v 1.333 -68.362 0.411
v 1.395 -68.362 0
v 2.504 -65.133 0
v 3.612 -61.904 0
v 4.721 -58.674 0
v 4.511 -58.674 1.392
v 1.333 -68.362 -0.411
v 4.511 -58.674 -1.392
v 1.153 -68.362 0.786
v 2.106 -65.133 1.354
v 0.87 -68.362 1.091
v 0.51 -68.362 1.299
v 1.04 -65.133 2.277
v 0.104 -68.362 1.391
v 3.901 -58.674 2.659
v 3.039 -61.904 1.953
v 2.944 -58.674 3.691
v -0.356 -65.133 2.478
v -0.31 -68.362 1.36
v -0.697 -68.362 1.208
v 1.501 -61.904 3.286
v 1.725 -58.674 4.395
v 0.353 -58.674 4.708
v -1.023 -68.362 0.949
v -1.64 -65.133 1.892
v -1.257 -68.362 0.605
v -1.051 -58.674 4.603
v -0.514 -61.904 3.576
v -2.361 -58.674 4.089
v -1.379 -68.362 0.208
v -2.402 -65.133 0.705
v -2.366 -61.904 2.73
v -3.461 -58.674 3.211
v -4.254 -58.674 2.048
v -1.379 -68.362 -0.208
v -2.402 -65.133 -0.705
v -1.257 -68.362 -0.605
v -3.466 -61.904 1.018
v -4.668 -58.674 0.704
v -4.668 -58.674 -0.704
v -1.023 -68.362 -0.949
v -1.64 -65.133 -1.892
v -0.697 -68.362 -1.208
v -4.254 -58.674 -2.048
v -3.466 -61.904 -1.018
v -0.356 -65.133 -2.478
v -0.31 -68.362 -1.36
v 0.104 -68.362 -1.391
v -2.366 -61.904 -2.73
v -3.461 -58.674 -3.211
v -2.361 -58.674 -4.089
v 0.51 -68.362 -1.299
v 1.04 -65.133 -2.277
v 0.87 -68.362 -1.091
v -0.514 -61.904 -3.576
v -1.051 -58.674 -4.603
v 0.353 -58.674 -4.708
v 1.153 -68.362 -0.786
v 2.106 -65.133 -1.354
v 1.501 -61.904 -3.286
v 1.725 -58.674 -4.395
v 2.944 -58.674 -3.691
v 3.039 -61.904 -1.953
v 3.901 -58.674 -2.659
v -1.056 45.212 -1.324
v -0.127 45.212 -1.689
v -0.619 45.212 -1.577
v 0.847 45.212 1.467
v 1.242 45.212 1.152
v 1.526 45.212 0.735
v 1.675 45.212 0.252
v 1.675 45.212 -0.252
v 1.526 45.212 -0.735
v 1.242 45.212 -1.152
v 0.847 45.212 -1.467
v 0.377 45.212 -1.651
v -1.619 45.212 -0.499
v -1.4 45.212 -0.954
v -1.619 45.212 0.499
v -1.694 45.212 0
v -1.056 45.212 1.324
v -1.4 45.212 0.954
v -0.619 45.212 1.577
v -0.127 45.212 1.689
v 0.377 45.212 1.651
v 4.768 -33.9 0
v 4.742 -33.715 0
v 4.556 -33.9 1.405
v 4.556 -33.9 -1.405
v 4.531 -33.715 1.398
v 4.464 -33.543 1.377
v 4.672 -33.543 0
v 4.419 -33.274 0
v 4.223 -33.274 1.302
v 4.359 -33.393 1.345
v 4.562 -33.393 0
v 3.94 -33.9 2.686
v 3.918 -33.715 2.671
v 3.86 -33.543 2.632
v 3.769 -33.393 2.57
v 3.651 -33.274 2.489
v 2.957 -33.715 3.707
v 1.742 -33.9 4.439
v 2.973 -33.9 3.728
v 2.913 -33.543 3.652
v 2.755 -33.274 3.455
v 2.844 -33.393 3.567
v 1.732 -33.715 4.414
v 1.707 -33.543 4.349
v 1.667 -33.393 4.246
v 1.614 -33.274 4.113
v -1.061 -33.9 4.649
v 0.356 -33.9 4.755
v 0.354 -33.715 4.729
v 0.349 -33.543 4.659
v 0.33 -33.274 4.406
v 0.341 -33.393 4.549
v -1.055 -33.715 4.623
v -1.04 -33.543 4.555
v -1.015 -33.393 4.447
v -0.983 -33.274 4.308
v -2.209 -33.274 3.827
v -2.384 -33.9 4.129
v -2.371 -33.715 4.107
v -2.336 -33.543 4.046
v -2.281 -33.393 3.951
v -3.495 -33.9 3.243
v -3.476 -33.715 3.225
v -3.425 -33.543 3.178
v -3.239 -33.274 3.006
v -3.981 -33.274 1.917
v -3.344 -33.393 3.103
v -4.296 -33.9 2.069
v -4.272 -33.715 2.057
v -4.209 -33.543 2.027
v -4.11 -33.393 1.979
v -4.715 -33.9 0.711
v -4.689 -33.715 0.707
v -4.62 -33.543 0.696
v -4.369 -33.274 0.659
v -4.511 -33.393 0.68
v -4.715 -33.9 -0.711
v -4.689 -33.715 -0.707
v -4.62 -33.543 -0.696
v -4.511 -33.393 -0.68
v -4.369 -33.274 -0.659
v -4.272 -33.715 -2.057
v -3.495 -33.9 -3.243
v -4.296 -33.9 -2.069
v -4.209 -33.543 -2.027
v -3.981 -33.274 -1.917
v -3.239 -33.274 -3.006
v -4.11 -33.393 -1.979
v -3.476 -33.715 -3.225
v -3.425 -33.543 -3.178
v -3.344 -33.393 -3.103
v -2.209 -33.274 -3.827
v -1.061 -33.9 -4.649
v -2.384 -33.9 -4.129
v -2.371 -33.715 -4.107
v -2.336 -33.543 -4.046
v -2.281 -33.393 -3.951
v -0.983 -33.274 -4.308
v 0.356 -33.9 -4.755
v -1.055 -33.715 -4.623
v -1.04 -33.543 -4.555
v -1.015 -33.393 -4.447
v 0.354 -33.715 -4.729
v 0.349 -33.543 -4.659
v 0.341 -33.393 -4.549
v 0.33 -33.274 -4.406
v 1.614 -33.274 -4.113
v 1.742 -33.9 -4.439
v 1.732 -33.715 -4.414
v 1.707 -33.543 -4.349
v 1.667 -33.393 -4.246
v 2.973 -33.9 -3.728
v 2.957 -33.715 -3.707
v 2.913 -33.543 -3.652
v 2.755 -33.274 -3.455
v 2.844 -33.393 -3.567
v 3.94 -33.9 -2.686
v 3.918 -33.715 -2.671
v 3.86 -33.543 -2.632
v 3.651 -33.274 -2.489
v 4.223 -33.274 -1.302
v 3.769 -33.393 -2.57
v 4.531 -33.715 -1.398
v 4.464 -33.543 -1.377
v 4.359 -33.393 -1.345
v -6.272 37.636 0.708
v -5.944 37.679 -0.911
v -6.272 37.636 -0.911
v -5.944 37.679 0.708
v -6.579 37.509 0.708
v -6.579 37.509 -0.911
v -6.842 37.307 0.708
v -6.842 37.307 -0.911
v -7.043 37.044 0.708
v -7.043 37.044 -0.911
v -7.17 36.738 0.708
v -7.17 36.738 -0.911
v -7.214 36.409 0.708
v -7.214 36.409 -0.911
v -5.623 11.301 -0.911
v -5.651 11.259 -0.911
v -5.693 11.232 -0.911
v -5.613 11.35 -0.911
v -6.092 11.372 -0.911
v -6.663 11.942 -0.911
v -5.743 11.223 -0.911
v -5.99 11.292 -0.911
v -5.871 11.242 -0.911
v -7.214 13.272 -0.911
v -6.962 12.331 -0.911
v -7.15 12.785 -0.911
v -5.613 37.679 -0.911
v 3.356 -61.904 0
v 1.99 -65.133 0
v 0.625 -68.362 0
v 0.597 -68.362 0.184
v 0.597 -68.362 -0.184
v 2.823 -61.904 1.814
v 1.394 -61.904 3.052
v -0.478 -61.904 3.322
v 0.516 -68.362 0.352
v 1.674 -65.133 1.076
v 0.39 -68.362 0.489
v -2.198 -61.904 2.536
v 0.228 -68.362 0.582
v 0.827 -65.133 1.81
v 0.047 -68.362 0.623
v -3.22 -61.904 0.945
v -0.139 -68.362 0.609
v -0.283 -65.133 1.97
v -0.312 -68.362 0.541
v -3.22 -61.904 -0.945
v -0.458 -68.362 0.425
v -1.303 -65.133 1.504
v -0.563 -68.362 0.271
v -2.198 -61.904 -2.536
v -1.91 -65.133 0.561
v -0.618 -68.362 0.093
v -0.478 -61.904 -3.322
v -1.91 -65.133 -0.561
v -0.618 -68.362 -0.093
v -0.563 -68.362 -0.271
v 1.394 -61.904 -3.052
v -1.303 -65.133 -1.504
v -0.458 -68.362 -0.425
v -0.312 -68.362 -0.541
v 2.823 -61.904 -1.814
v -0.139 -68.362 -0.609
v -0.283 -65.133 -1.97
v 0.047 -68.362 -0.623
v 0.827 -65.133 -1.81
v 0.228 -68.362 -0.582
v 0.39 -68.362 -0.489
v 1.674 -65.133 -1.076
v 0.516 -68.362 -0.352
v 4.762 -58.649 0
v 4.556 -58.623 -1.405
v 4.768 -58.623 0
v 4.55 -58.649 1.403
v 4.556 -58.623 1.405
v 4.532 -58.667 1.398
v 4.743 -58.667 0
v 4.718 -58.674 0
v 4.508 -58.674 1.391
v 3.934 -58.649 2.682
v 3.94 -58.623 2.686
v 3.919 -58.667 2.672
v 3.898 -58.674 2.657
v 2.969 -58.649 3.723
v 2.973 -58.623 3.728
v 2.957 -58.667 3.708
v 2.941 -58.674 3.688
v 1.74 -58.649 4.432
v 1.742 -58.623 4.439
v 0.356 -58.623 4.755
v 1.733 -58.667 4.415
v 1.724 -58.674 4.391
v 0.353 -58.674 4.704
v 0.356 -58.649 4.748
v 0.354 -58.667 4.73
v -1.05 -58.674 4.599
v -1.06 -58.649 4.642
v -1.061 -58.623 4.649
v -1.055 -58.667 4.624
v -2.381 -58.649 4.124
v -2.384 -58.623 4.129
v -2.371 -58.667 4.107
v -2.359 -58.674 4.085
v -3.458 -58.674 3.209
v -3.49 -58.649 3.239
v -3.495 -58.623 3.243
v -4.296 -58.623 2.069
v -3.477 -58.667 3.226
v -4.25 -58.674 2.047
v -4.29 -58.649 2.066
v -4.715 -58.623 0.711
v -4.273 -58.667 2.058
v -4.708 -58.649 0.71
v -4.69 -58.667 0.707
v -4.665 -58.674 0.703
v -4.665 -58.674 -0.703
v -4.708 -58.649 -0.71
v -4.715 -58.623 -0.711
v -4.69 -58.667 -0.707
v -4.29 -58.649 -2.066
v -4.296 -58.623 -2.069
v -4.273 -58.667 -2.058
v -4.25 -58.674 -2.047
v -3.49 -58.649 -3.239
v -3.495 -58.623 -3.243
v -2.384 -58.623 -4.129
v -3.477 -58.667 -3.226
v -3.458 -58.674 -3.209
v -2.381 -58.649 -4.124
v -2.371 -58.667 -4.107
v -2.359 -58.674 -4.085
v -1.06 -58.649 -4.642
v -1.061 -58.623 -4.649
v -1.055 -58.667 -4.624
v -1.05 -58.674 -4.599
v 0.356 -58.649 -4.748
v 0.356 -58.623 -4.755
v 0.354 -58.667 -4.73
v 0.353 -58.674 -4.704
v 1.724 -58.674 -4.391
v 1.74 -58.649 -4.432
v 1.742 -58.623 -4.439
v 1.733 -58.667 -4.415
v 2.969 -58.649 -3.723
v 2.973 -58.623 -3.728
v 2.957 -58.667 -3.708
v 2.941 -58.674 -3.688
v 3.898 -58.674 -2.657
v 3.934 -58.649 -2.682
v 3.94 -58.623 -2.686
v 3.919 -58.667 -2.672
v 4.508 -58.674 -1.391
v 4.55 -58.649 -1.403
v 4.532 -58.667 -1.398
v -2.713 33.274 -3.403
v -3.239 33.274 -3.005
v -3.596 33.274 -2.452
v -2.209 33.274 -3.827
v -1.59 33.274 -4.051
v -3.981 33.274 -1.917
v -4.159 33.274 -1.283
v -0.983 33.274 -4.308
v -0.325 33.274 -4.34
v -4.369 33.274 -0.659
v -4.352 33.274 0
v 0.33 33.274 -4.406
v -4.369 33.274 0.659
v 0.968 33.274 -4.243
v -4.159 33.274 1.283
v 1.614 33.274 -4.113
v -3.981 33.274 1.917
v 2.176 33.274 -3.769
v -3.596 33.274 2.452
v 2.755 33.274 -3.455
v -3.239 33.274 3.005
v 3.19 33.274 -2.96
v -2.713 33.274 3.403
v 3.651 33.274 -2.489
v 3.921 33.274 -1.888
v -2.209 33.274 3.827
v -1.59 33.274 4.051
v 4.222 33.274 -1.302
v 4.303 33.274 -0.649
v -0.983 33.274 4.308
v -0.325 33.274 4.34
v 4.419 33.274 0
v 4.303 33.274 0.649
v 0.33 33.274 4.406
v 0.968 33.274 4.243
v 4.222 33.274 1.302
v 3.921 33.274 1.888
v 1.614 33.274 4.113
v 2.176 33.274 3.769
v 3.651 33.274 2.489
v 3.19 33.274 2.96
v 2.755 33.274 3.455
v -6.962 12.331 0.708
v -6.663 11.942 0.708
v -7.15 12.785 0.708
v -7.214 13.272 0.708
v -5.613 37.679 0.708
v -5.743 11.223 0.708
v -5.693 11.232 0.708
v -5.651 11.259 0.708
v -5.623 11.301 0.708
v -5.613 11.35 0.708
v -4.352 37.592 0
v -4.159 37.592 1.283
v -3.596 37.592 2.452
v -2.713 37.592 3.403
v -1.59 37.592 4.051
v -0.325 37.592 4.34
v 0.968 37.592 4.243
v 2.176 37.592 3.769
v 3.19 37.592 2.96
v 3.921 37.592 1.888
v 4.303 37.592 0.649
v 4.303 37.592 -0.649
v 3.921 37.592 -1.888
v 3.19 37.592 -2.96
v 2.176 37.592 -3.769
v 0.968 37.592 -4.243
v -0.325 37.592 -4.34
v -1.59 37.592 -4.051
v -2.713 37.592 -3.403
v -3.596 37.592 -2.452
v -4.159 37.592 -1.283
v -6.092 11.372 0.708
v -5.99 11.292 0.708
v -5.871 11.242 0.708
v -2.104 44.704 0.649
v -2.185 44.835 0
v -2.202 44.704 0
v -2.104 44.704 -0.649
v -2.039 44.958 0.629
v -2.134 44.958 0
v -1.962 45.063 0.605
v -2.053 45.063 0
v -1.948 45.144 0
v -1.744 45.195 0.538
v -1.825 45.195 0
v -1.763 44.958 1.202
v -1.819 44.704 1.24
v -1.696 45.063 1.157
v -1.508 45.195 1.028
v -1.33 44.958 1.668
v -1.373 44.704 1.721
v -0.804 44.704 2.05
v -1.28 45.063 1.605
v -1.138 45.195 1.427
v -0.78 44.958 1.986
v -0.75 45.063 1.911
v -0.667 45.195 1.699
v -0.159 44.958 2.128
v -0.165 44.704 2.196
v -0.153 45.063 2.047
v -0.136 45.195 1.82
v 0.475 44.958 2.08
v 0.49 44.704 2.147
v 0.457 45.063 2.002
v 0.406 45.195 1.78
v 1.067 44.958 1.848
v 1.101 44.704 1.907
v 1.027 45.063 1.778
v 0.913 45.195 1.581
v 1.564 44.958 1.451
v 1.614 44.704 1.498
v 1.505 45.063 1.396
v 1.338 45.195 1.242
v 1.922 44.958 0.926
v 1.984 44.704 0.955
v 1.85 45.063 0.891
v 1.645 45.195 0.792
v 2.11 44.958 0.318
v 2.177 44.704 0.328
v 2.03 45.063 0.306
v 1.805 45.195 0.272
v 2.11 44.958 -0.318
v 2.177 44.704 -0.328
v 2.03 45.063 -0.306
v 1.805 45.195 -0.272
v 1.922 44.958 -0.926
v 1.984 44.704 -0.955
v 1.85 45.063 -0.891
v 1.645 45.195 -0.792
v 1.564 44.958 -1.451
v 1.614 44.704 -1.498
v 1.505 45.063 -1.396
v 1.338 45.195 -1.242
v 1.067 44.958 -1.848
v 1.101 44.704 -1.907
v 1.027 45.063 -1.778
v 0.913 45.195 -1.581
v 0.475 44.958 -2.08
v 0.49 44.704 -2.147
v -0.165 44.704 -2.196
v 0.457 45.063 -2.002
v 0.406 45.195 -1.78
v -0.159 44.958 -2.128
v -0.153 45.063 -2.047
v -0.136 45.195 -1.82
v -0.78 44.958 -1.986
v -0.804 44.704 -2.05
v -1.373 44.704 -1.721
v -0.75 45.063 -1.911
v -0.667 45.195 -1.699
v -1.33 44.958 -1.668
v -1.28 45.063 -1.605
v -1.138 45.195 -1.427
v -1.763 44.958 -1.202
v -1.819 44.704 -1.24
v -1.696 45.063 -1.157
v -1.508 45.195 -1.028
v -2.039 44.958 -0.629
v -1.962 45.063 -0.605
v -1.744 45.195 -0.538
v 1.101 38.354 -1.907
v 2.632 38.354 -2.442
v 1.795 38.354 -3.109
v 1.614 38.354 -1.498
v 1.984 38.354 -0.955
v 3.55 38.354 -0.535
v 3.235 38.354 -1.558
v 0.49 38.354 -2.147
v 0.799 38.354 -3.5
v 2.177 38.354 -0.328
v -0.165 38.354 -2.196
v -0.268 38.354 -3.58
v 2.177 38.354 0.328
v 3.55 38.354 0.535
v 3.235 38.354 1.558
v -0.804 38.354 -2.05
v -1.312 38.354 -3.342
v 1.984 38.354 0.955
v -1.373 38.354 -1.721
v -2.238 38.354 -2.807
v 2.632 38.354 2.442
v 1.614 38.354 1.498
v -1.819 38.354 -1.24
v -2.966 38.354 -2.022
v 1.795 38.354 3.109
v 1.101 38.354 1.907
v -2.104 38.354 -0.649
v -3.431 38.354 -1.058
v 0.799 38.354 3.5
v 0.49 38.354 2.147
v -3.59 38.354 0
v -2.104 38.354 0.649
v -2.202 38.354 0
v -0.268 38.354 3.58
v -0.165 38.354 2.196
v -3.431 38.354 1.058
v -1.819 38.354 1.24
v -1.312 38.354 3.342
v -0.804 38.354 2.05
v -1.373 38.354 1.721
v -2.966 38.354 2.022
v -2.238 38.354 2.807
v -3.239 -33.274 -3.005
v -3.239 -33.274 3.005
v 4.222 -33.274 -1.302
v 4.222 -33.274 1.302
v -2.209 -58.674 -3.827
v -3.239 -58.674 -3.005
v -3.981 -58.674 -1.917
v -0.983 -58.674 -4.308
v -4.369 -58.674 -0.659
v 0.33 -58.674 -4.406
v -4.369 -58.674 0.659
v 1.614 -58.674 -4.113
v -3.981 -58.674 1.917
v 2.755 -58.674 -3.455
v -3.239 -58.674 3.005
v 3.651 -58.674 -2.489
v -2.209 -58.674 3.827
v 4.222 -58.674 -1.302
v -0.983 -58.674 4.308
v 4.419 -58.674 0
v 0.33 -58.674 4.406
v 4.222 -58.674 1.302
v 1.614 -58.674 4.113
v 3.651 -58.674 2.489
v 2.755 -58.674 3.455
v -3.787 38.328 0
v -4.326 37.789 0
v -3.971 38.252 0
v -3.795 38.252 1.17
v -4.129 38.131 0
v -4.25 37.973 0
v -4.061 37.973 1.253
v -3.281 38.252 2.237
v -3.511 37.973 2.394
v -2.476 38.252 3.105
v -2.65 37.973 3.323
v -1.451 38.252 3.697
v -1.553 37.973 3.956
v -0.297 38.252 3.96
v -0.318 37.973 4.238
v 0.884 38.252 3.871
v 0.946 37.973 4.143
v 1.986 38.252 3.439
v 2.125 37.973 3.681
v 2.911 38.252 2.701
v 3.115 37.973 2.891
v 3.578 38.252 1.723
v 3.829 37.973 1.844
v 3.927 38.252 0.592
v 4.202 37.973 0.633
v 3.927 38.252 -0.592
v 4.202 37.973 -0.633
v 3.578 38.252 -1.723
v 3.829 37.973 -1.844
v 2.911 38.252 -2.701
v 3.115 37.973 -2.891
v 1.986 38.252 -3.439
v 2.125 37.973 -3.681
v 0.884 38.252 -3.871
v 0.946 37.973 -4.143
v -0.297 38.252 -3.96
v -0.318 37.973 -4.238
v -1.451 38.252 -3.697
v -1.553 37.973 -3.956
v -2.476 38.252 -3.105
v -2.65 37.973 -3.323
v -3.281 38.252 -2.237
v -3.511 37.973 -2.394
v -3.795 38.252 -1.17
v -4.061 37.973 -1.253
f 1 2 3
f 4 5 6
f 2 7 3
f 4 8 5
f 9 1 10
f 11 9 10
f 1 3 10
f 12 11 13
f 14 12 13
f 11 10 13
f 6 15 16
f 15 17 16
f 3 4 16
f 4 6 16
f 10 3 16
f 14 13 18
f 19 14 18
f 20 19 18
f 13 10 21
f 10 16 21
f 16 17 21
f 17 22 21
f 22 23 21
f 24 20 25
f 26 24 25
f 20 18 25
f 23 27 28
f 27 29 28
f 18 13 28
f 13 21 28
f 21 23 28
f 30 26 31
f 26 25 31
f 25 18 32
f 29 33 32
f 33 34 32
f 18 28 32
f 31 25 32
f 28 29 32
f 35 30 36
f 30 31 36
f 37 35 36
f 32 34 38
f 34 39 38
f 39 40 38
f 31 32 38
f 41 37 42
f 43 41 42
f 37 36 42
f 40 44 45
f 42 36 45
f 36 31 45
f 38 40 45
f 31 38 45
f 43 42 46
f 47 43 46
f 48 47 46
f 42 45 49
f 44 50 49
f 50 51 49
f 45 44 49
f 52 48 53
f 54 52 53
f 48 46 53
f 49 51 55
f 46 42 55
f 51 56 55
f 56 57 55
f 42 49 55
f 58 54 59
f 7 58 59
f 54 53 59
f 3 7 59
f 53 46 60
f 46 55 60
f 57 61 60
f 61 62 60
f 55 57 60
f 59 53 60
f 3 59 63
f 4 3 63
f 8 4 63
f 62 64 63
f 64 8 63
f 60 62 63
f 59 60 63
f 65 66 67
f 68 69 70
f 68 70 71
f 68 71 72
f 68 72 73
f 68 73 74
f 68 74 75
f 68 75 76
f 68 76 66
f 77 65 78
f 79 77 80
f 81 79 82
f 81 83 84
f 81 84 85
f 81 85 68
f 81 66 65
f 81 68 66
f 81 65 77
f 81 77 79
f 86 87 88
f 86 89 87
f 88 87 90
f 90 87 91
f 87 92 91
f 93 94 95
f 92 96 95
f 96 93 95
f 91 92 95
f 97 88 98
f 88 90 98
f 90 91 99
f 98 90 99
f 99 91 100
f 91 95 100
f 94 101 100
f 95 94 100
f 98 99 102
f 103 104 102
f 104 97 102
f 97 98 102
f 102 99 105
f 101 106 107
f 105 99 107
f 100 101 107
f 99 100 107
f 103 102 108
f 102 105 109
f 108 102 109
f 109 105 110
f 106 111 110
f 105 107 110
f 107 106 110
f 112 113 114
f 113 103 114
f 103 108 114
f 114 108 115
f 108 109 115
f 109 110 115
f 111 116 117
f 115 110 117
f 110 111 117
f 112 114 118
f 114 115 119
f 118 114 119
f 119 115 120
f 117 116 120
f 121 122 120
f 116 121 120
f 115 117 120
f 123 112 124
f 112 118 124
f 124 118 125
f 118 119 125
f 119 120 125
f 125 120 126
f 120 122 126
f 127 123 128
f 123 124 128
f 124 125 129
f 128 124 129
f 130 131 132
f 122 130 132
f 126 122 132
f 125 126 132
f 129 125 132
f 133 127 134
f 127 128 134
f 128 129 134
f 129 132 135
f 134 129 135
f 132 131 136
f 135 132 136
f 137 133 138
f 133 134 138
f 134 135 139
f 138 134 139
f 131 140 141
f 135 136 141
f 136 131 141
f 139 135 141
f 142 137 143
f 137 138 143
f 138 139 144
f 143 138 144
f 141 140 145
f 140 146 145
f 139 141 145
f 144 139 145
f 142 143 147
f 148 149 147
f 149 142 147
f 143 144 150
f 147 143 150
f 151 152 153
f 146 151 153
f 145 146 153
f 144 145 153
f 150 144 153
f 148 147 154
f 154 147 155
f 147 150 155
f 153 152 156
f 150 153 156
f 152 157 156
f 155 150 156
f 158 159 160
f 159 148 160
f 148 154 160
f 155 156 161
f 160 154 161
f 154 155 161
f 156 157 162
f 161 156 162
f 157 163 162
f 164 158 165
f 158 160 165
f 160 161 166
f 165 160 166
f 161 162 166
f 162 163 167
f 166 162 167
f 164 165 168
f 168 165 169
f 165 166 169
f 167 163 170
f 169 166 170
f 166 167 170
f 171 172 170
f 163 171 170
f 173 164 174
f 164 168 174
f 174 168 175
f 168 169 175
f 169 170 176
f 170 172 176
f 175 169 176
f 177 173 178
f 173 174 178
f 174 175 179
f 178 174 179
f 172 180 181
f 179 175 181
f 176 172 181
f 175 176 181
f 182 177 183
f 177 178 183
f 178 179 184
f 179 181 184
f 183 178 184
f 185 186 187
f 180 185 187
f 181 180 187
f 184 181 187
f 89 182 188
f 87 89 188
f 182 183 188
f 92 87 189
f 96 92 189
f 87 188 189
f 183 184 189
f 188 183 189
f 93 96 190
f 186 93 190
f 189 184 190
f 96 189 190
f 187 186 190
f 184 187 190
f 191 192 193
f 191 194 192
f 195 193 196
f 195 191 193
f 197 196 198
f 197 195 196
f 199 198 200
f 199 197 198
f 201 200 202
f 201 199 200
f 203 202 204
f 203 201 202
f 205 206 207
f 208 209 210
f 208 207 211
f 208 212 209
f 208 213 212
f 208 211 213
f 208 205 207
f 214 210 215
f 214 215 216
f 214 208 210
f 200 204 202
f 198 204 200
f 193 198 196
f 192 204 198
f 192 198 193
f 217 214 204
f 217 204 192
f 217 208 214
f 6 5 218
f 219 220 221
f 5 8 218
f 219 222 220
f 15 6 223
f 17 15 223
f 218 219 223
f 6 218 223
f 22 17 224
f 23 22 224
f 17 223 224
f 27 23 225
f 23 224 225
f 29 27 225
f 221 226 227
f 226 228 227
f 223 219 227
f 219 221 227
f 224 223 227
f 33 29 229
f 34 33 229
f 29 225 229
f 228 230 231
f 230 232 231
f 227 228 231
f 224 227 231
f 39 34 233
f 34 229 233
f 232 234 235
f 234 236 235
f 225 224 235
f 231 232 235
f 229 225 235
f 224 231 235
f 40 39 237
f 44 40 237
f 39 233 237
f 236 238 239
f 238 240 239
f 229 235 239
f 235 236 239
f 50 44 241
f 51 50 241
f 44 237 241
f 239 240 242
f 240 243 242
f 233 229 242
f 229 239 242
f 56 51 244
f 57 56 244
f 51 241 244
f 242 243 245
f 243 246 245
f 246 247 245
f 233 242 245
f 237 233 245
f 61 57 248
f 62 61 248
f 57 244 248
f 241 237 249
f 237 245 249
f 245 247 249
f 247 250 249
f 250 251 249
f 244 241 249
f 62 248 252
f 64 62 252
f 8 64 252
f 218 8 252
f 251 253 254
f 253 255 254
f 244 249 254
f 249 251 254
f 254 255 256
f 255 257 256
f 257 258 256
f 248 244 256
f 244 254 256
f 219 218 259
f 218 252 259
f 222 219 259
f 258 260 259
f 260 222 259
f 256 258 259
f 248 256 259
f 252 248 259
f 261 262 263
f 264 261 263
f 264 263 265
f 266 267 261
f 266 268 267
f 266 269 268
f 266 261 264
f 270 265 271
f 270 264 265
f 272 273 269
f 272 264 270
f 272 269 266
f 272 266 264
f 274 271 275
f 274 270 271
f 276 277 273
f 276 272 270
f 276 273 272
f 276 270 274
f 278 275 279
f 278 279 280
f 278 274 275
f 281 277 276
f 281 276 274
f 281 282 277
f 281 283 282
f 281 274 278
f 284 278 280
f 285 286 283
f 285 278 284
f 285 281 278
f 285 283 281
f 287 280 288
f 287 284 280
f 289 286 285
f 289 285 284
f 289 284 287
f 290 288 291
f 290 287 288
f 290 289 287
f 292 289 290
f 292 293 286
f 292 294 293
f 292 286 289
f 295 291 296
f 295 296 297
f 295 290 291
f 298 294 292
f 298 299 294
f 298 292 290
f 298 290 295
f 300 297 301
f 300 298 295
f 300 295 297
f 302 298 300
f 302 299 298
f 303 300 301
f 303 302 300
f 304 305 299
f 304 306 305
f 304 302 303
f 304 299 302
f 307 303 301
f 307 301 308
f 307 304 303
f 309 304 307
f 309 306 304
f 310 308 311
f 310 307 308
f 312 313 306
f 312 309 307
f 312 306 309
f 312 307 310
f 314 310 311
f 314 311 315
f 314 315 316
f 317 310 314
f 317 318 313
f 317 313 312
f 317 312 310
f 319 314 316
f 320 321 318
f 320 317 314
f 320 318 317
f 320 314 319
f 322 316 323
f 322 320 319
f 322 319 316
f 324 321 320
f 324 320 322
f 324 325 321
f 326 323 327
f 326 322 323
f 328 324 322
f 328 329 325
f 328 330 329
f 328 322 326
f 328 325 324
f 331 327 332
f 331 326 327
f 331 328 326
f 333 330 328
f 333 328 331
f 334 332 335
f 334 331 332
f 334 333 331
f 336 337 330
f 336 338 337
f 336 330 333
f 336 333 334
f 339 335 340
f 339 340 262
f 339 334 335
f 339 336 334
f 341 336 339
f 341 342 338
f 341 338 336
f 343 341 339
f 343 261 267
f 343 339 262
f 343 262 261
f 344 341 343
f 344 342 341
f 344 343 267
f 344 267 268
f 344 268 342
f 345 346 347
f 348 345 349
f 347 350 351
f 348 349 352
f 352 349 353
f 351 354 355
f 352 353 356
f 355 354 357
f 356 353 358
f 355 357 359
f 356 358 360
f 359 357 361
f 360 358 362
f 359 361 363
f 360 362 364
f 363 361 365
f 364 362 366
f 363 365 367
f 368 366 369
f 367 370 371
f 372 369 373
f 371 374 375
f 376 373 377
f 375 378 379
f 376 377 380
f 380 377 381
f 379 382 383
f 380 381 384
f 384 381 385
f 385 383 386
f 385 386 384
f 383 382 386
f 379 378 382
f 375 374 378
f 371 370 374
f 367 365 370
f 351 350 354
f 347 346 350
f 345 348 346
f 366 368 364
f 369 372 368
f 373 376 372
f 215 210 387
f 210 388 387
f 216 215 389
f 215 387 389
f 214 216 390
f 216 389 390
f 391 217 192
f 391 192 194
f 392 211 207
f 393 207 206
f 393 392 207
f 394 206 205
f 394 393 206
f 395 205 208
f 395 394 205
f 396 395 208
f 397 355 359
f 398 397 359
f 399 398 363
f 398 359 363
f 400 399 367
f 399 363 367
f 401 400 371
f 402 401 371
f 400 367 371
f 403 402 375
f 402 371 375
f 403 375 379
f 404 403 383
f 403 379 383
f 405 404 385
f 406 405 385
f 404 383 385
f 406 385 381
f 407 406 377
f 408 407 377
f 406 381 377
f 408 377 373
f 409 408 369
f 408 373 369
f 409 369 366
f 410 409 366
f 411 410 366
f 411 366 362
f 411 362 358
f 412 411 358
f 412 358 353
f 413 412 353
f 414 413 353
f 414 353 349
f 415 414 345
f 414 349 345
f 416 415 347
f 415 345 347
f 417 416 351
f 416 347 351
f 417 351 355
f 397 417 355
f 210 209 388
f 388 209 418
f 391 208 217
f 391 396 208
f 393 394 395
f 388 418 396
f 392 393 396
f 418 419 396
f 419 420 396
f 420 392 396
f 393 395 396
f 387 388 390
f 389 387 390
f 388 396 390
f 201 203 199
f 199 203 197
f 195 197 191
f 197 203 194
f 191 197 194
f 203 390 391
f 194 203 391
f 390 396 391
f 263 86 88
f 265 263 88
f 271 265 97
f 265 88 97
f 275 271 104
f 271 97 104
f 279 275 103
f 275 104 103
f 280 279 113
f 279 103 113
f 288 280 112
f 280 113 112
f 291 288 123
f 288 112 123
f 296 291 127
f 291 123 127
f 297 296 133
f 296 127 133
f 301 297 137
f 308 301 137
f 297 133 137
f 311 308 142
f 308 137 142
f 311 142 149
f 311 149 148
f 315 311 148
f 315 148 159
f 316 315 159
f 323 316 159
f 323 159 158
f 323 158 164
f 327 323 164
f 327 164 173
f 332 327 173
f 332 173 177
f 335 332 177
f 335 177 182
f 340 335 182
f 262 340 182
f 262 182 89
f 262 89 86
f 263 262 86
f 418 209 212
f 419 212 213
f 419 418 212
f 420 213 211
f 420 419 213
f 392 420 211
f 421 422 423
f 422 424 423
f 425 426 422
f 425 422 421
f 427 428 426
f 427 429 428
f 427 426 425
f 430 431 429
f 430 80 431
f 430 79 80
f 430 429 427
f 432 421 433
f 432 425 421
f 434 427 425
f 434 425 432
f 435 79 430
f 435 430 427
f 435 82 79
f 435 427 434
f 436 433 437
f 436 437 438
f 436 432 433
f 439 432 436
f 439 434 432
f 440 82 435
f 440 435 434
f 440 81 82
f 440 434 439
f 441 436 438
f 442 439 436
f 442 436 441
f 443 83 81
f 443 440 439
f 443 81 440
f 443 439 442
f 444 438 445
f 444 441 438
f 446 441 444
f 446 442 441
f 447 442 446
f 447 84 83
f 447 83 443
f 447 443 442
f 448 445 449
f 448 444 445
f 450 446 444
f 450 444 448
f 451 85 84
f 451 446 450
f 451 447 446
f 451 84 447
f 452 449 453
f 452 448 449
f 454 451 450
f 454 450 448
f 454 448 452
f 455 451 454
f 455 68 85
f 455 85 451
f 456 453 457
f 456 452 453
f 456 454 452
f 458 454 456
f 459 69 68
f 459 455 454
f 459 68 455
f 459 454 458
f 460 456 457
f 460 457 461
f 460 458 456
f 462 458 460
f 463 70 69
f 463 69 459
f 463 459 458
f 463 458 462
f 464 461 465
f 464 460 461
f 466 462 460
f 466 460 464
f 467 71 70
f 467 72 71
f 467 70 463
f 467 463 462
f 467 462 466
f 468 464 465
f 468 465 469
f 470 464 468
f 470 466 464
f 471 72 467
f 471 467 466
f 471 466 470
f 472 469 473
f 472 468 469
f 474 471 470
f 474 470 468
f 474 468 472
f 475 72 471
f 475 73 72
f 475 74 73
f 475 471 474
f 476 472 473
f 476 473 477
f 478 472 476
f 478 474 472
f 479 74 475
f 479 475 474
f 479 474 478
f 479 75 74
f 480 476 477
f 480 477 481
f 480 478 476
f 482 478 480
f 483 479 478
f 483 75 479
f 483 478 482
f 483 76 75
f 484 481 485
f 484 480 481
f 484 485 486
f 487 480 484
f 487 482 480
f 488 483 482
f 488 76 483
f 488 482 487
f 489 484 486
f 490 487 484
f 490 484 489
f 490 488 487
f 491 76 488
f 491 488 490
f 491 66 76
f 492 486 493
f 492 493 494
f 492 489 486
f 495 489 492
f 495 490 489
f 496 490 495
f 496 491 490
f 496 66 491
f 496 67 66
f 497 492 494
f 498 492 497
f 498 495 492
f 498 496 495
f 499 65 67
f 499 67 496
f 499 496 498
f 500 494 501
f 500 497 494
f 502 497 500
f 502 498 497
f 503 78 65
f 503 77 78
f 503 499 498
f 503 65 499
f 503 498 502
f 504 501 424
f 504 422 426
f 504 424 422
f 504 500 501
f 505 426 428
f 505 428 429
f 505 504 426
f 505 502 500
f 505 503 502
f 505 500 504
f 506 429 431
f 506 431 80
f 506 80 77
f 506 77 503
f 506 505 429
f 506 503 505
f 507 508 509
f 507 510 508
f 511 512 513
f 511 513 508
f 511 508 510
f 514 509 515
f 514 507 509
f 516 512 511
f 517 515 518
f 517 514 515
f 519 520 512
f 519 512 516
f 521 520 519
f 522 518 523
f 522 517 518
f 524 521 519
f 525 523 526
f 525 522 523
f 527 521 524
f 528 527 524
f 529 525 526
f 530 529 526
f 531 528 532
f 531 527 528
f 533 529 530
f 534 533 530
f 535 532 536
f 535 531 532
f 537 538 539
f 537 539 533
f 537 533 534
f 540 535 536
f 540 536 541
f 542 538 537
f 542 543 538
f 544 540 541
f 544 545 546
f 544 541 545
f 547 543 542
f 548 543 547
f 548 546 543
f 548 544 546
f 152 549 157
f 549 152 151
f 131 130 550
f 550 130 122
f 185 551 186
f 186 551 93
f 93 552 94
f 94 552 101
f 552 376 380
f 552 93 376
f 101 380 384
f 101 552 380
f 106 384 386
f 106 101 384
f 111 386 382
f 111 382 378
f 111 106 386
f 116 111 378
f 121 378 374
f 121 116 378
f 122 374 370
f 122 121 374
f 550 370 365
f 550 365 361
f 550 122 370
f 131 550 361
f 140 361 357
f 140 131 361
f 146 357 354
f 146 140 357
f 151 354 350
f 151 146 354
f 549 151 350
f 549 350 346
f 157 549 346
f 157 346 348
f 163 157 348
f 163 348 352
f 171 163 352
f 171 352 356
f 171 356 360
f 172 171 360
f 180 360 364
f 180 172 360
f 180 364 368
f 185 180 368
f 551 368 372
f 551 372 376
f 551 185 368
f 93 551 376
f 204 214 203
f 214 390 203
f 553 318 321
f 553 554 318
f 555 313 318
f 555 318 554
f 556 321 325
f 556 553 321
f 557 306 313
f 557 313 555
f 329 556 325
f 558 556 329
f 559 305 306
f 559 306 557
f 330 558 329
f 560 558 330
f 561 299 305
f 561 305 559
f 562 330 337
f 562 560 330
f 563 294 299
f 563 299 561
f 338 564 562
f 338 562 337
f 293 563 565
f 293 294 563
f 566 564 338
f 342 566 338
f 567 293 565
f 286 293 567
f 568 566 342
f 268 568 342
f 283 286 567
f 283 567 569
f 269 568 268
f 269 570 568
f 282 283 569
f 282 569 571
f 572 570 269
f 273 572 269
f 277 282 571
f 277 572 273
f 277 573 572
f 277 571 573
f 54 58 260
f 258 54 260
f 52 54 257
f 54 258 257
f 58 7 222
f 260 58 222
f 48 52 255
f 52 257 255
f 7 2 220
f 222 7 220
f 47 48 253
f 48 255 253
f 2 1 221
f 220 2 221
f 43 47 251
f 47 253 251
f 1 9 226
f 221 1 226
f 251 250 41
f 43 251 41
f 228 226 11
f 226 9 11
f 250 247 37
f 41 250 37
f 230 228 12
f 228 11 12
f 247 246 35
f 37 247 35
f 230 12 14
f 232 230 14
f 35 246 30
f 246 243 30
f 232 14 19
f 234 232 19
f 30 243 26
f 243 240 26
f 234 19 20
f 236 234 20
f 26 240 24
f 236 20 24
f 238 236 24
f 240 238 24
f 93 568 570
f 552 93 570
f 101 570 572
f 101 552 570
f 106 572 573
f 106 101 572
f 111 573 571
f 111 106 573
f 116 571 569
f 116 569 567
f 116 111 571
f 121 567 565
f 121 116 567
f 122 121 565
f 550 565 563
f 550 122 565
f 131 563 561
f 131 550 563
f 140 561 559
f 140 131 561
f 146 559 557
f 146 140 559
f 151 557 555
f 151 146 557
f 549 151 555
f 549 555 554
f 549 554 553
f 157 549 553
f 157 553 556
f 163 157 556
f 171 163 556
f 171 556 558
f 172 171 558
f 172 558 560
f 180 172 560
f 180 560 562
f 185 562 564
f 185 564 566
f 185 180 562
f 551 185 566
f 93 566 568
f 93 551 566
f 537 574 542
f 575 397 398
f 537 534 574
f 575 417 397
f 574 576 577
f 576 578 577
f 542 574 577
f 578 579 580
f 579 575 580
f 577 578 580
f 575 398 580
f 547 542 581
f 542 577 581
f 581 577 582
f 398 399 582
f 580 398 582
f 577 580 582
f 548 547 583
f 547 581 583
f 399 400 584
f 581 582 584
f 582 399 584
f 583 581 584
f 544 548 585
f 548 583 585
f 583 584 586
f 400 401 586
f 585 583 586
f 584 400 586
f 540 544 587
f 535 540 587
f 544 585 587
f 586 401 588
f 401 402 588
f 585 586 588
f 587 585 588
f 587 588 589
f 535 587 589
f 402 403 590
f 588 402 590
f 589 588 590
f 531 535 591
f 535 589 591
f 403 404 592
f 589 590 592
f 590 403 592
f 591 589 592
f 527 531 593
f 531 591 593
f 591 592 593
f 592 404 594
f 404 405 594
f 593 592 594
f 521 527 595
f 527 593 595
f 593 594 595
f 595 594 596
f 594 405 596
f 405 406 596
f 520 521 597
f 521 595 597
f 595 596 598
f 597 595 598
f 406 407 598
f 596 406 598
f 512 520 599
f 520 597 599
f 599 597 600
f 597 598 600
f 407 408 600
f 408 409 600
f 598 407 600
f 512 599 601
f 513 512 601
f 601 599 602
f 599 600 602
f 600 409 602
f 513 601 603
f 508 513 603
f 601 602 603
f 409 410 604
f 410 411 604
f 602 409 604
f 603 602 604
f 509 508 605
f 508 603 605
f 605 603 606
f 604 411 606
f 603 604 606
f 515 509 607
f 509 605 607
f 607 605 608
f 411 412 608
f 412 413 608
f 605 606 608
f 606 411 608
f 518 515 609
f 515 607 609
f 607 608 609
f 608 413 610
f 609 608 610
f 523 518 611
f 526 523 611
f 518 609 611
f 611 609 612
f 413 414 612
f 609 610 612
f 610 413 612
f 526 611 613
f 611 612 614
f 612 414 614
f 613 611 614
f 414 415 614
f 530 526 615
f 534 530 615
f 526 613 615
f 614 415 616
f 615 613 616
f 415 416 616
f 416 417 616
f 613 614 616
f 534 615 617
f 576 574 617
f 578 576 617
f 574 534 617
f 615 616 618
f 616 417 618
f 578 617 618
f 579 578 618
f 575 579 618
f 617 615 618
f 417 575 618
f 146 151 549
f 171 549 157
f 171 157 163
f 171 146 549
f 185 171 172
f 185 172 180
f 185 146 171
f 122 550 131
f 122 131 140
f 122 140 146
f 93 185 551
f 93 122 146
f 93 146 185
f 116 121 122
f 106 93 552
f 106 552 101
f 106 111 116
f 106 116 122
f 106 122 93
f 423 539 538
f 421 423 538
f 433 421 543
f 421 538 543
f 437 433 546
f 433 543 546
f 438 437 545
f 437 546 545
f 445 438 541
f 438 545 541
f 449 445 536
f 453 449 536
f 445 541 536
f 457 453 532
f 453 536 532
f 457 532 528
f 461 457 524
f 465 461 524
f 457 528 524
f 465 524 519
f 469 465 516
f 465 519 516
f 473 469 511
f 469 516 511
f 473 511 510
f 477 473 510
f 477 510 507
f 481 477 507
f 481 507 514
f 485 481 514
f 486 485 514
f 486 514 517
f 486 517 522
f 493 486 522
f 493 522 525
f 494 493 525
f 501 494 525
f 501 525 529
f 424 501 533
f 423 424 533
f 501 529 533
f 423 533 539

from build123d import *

# Parameters (mm, degrees)
F0_R      = 4.4185747542
F1_DEPTH  = 33.274
F2_R      = 4.3520524893
F3_DEPTH  = 5.08
F4_R      = 2.2018395717
F5_DEPTH  = 6.858
F6_R      = 4.7683130079
F6_R_2    = 4.4185747542
F7_DEPTH  = 25.4
F12_W     = 26.4561073855
F12_H     = 1.6188730951
F13_DEPTH = 1.6002
F17_R     = 0.0508
F18_R     = 0.508
F19_R     = 0.762
F20_R     = 1.27
F21_SIZE  = 1.27
F22_R     = 0.508
F23_R     = 0.127
F24_R     = 1.8805178093


# Not quite as in the source:
# - a fillet or chamfer that OpenCascade refuses, or shapes differently, is made with other operations: its cross-section is extruded or revolved along the edge and cut away or added
# - the program builds the solid bodies; features that only make, move or delete a surface that nothing else refers to are left out


with BuildPart() as f1:
    # F0 (on Front) → F1 (new body, symmetric)
    with BuildSketch(Plane.XZ):
        Circle(F0_R)
    extrude(amount=F1_DEPTH, both=True)

    # F2 (on face) → F3 (join)
    with BuildSketch(Plane(origin=(0, 33.274, 0), x_dir=(-1, 0, 0), z_dir=(0, 1, 0))):
        Circle(F2_R)
    extrude(amount=F3_DEPTH)

    # F4 (on face) → F5 (join)
    with BuildSketch(Plane(origin=(0, 38.354, 0), x_dir=(-1, 0, 0), z_dir=(0, 1, 0))):
        Circle(F4_R)
    extrude(amount=F5_DEPTH)

    # F18
    f18_edges = [f1.edges().sort_by_distance(p)[0] for p in [
        (2.20184, 45.212, 0),
    ]]
    fillet(f18_edges, radius=F18_R)

    # F19
    f19_edges = [f1.edges().sort_by_distance(p)[0] for p in [
        (4.352052, 38.354, 0),
    ]]
    fillet(f19_edges, radius=F19_R)


with BuildPart() as f7:
    # F6 (on face) → F7 (new body)
    with BuildSketch(Plane.XZ.offset(33.274)):
        Circle(F6_R)
        Circle(F6_R_2, mode=Mode.SUBTRACT)
    extrude(amount=F7_DEPTH)

    # F16: fillet of radius 0.762 on 1 edges, made by hand

    # F16_s1 → F16_t2 (revolve, cut)
    with BuildSketch(Plane.XY):
        with BuildLine():
            ThreePointArc((4.7684630079, -33.9147646456), (4.6753183658, -33.5496940905), (4.4186558946, -33.2738738404))
            Line((4.4186558946, -33.2738738404), (4.4268997523, -33.2610560243))
            ThreePointArc((4.4268997523, -33.2610560243), (4.5934844512, -33.25876), (4.7683130079, -33.25876))
            Line((4.7683130079, -33.25876), (4.7835530079, -33.274))
            ThreePointArc((4.7835530079, -33.274), (4.7835530079, -33.5943823228), (4.7837030079, -33.9147646456))
            Line((4.7837030079, -33.9147646456), (4.7684630079, -33.9147646456))
        make_face()
    revolve(axis=Axis((0, -33.274, 0), (0, -1, 0)), mode=Mode.SUBTRACT)

    # F17
    f17_edges = [f7.edges().sort_by_distance(p)[0] for p in [
        (-4.768313, -58.674, 0),
    ]]
    fillet(f17_edges, radius=F17_R)


with BuildPart() as f13:
    # F12 (on offset) → F13 (new body)
    with BuildSketch(Plane.YZ.offset(-5.6134)):
        with Locations((24.4508138858, -0.1013565925)):
            Rectangle(F12_W, F12_H)
    extrude(amount=-F13_DEPTH)

    # F20
    f20_edges = [f13.edges().sort_by_distance(p)[0] for p in [
        (-7.2136, 37.678868, -0.101357),
    ]]
    fillet(f20_edges, radius=F20_R)

    # F21
    f21_edges = [f13.edges().sort_by_distance(p)[0] for p in [
        (-7.2136, 11.22276, -0.101357),
    ]]
    chamfer(f21_edges, length=F21_SIZE)

    # F22
    f22_edges = [f13.edges().sort_by_distance(p)[0] for p in [
        (-5.9436, 11.22276, -0.101357),
    ]]
    fillet(f22_edges, radius=F22_R)

    # F23
    f23_edges = [f13.edges().sort_by_distance(p)[0] for p in [
        (-5.6134, 11.22276, -0.101357),
    ]]
    fillet(f23_edges, radius=F23_R)

    # F24
    f24_edges = [f13.edges().sort_by_distance(p)[0] for p in [
        (-7.2136, 12.49276, -0.101357),
    ]]
    fillet(f24_edges, radius=F24_R)


with BuildPart() as f15:
    # F14 (on Top) → F15 (revolve)
    with BuildSketch(Plane.XY):
        Polygon((1.394969644, -68.3624893427), (4.7210464254, -58.6740672588), (0.6249820581, -68.3624893427), align=None)
    revolve(axis=Axis((0, -58.674, 0), (0, -1, 0)))


solid = Compound([f1.part, f7.part, f13.part, f15.part])
